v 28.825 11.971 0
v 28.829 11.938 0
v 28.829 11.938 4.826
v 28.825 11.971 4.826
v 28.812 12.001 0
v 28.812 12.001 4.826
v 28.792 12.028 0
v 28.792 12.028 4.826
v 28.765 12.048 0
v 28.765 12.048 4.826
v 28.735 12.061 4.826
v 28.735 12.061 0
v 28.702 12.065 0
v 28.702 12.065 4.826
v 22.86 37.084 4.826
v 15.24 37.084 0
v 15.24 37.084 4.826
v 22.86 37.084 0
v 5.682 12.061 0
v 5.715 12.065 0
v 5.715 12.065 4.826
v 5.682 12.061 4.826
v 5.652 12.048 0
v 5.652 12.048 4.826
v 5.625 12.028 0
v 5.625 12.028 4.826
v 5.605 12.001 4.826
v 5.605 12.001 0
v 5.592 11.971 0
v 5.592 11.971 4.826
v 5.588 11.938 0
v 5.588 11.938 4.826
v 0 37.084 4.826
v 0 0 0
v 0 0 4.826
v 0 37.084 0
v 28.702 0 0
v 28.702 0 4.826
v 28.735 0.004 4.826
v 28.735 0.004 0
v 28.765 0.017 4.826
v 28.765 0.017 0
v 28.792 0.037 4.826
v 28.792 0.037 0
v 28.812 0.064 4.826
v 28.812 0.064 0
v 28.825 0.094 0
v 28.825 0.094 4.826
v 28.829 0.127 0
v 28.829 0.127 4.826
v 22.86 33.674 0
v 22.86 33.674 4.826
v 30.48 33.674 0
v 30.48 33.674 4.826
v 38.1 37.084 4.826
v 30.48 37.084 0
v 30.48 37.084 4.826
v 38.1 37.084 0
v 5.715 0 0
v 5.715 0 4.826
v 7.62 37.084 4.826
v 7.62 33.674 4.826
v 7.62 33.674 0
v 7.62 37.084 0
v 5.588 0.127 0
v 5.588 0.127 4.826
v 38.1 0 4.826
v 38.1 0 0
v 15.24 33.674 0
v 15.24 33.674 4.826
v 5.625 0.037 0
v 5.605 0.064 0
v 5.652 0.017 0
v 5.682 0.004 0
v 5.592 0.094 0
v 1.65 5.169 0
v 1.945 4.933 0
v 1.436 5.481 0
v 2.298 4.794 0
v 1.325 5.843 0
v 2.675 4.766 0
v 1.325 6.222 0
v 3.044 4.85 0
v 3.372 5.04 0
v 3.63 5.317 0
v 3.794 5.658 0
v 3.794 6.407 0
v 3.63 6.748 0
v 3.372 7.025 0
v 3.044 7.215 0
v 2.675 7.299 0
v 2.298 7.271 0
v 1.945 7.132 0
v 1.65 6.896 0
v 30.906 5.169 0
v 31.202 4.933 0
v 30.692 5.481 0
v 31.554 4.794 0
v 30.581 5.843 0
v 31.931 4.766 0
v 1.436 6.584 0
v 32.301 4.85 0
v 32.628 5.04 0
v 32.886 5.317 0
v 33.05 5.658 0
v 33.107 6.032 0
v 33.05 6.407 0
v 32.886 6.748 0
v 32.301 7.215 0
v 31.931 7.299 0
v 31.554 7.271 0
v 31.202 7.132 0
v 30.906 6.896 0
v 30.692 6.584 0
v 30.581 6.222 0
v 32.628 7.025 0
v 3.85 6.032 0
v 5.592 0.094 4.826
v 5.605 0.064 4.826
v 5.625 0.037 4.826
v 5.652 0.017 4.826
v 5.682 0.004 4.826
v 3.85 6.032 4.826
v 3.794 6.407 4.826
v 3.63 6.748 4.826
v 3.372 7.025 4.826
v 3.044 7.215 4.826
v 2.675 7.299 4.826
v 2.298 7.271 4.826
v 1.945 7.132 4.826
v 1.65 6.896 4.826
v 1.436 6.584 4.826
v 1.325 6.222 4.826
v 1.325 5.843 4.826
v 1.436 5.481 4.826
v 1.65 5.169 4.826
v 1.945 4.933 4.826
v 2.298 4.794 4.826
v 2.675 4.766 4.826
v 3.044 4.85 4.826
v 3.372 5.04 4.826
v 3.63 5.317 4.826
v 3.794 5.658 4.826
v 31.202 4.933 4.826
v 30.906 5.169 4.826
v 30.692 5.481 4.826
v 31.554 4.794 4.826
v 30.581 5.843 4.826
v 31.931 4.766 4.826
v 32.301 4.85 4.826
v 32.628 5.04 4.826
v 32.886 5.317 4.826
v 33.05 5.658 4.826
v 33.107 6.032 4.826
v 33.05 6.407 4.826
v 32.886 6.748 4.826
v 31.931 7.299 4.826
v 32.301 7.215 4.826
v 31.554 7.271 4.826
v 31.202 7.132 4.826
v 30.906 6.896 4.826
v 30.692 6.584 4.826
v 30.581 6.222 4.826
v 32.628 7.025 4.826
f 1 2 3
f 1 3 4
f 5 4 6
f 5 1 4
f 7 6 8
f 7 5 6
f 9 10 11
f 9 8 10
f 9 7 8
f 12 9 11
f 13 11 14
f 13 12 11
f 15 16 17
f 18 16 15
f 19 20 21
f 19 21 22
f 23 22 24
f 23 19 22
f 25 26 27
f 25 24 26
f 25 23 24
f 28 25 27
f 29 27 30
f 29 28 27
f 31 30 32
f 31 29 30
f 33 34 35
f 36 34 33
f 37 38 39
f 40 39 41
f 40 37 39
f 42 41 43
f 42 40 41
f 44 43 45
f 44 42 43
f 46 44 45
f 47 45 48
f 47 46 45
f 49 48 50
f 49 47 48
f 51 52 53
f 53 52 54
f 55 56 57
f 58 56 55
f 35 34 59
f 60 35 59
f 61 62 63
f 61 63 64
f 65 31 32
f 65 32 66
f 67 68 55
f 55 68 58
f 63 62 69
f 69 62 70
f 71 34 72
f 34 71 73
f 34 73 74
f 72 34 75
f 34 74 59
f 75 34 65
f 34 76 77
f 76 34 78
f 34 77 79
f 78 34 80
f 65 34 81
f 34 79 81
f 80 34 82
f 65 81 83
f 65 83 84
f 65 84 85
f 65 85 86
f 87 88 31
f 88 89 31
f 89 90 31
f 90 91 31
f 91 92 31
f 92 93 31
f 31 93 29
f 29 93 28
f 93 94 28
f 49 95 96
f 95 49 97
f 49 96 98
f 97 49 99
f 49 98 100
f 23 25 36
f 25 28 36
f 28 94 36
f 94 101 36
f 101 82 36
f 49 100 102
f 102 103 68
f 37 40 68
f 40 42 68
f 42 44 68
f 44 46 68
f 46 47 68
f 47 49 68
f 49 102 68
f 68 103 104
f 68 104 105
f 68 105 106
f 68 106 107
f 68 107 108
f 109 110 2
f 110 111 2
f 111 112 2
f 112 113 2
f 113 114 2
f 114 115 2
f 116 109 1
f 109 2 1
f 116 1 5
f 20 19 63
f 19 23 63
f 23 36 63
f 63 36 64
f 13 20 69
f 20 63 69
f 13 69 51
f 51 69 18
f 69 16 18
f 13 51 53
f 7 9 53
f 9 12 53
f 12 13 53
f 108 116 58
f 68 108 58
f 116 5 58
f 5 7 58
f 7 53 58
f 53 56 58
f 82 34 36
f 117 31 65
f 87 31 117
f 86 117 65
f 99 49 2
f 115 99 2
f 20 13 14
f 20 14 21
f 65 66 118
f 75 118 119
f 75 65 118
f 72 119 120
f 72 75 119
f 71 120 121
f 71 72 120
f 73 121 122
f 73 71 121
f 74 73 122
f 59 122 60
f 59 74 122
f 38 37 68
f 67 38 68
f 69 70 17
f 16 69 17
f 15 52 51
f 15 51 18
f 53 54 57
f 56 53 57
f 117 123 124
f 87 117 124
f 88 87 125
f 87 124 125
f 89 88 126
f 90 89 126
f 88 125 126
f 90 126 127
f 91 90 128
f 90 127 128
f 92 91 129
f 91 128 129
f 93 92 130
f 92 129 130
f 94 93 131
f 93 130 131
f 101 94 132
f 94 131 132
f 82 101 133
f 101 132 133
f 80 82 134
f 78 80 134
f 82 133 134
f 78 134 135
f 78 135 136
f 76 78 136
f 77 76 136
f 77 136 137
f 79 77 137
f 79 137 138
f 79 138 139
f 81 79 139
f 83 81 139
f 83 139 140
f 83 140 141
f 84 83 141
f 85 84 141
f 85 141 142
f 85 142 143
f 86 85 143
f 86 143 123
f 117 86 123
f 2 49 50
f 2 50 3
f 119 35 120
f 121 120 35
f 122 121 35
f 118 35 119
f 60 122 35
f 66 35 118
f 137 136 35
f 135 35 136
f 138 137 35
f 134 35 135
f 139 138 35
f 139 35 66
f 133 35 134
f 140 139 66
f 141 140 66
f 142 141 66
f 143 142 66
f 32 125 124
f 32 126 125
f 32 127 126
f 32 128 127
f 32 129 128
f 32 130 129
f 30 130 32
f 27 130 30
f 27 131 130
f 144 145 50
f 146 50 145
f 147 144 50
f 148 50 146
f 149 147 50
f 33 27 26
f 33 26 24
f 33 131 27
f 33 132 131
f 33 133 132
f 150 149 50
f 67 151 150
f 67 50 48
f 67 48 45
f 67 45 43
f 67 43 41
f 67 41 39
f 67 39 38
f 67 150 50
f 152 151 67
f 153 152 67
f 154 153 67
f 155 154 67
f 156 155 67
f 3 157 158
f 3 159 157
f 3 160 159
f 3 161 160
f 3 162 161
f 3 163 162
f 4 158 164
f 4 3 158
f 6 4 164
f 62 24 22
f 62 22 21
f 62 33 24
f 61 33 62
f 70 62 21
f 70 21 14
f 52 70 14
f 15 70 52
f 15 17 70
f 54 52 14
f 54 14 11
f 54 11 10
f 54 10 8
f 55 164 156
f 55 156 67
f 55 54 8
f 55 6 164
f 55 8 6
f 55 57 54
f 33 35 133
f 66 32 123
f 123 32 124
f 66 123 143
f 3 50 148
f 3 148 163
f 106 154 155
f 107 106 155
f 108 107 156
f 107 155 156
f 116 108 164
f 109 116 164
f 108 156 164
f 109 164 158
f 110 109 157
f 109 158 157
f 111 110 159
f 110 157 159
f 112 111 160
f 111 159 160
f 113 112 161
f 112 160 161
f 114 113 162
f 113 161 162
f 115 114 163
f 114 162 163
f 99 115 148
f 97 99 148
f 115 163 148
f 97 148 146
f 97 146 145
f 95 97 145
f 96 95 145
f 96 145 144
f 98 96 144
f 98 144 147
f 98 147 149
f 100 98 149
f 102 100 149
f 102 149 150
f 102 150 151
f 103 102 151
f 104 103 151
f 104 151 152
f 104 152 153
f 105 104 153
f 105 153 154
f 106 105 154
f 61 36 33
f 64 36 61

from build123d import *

# Parameters (mm, degrees)
SKETCH1_W           = 38.1
SKETCH1_H           = 37.084
BOSS_EXTRUDE1_DEPTH = 4.826
SKETCH3_R           = 1.27
CUT_EXTRUDE2_DEPTH  = 54.386546358
CUT_EXTRUDE3_DEPTH  = 54.386546358
SKETCH5_W           = 7.62
SKETCH5_H           = 3.409901171
CUT_EXTRUDE4_DEPTH  = 54.386546358


with BuildPart() as part:
    # Sketch1 → Boss-Extrude1 (new body)
    with BuildSketch(Plane.XY):
        with Locations((19.05, 18.542)):
            Rectangle(SKETCH1_W, SKETCH1_H)
    extrude(amount=BOSS_EXTRUDE1_DEPTH)

    # Sketch3 → Cut-Extrude2 (cut, through all)
    with BuildSketch(Plane.XY.offset(4.826)):
        with Locations((2.580480538, 6.0325)):
            Circle(SKETCH3_R)
        with Locations((31.836519462, 6.0325)):
            Circle(SKETCH3_R)
    extrude(amount=-CUT_EXTRUDE2_DEPTH, mode=Mode.SUBTRACT)

    # Sketch4 → Cut-Extrude3 (cut, through all)
    with BuildSketch(Plane(origin=(0, 0, 0), x_dir=(-1, 0, 0), z_dir=(0, 0, -1))):
        with BuildLine():
            Line((-28.702, 12.065), (-5.715, 12.065))
            ThreePointArc((-5.715, 12.065), (-5.625197439, 12.027802561), (-5.588, 11.938))
            Line((-5.588, 11.938), (-5.588, 0.127))
            ThreePointArc((-5.588, 0.127), (-5.625197439, 0.037197439), (-5.715, 0))
            Line((-5.715, 0), (-28.702, 0))
            ThreePointArc((-28.702, 0), (-28.791802561, 0.037197439), (-28.829, 0.127))
            Line((-28.829, 0.127), (-28.829, 11.938))
            ThreePointArc((-28.829, 11.938), (-28.791802561, 12.027802561), (-28.702, 12.065))
        make_face()
    extrude(amount=-CUT_EXTRUDE3_DEPTH, mode=Mode.SUBTRACT)

    # Sketch5 → Cut-Extrude4 (cut, through all)
    with BuildSketch(Plane.XY.offset(4.826)):
        with Locations((11.43, 35.379049415)):
            Rectangle(SKETCH5_W, SKETCH5_H)
        with Locations((26.67, 35.379049415)):
            Rectangle(SKETCH5_W, SKETCH5_H)
    extrude(amount=-CUT_EXTRUDE4_DEPTH, mode=Mode.SUBTRACT)


solid = part.part
